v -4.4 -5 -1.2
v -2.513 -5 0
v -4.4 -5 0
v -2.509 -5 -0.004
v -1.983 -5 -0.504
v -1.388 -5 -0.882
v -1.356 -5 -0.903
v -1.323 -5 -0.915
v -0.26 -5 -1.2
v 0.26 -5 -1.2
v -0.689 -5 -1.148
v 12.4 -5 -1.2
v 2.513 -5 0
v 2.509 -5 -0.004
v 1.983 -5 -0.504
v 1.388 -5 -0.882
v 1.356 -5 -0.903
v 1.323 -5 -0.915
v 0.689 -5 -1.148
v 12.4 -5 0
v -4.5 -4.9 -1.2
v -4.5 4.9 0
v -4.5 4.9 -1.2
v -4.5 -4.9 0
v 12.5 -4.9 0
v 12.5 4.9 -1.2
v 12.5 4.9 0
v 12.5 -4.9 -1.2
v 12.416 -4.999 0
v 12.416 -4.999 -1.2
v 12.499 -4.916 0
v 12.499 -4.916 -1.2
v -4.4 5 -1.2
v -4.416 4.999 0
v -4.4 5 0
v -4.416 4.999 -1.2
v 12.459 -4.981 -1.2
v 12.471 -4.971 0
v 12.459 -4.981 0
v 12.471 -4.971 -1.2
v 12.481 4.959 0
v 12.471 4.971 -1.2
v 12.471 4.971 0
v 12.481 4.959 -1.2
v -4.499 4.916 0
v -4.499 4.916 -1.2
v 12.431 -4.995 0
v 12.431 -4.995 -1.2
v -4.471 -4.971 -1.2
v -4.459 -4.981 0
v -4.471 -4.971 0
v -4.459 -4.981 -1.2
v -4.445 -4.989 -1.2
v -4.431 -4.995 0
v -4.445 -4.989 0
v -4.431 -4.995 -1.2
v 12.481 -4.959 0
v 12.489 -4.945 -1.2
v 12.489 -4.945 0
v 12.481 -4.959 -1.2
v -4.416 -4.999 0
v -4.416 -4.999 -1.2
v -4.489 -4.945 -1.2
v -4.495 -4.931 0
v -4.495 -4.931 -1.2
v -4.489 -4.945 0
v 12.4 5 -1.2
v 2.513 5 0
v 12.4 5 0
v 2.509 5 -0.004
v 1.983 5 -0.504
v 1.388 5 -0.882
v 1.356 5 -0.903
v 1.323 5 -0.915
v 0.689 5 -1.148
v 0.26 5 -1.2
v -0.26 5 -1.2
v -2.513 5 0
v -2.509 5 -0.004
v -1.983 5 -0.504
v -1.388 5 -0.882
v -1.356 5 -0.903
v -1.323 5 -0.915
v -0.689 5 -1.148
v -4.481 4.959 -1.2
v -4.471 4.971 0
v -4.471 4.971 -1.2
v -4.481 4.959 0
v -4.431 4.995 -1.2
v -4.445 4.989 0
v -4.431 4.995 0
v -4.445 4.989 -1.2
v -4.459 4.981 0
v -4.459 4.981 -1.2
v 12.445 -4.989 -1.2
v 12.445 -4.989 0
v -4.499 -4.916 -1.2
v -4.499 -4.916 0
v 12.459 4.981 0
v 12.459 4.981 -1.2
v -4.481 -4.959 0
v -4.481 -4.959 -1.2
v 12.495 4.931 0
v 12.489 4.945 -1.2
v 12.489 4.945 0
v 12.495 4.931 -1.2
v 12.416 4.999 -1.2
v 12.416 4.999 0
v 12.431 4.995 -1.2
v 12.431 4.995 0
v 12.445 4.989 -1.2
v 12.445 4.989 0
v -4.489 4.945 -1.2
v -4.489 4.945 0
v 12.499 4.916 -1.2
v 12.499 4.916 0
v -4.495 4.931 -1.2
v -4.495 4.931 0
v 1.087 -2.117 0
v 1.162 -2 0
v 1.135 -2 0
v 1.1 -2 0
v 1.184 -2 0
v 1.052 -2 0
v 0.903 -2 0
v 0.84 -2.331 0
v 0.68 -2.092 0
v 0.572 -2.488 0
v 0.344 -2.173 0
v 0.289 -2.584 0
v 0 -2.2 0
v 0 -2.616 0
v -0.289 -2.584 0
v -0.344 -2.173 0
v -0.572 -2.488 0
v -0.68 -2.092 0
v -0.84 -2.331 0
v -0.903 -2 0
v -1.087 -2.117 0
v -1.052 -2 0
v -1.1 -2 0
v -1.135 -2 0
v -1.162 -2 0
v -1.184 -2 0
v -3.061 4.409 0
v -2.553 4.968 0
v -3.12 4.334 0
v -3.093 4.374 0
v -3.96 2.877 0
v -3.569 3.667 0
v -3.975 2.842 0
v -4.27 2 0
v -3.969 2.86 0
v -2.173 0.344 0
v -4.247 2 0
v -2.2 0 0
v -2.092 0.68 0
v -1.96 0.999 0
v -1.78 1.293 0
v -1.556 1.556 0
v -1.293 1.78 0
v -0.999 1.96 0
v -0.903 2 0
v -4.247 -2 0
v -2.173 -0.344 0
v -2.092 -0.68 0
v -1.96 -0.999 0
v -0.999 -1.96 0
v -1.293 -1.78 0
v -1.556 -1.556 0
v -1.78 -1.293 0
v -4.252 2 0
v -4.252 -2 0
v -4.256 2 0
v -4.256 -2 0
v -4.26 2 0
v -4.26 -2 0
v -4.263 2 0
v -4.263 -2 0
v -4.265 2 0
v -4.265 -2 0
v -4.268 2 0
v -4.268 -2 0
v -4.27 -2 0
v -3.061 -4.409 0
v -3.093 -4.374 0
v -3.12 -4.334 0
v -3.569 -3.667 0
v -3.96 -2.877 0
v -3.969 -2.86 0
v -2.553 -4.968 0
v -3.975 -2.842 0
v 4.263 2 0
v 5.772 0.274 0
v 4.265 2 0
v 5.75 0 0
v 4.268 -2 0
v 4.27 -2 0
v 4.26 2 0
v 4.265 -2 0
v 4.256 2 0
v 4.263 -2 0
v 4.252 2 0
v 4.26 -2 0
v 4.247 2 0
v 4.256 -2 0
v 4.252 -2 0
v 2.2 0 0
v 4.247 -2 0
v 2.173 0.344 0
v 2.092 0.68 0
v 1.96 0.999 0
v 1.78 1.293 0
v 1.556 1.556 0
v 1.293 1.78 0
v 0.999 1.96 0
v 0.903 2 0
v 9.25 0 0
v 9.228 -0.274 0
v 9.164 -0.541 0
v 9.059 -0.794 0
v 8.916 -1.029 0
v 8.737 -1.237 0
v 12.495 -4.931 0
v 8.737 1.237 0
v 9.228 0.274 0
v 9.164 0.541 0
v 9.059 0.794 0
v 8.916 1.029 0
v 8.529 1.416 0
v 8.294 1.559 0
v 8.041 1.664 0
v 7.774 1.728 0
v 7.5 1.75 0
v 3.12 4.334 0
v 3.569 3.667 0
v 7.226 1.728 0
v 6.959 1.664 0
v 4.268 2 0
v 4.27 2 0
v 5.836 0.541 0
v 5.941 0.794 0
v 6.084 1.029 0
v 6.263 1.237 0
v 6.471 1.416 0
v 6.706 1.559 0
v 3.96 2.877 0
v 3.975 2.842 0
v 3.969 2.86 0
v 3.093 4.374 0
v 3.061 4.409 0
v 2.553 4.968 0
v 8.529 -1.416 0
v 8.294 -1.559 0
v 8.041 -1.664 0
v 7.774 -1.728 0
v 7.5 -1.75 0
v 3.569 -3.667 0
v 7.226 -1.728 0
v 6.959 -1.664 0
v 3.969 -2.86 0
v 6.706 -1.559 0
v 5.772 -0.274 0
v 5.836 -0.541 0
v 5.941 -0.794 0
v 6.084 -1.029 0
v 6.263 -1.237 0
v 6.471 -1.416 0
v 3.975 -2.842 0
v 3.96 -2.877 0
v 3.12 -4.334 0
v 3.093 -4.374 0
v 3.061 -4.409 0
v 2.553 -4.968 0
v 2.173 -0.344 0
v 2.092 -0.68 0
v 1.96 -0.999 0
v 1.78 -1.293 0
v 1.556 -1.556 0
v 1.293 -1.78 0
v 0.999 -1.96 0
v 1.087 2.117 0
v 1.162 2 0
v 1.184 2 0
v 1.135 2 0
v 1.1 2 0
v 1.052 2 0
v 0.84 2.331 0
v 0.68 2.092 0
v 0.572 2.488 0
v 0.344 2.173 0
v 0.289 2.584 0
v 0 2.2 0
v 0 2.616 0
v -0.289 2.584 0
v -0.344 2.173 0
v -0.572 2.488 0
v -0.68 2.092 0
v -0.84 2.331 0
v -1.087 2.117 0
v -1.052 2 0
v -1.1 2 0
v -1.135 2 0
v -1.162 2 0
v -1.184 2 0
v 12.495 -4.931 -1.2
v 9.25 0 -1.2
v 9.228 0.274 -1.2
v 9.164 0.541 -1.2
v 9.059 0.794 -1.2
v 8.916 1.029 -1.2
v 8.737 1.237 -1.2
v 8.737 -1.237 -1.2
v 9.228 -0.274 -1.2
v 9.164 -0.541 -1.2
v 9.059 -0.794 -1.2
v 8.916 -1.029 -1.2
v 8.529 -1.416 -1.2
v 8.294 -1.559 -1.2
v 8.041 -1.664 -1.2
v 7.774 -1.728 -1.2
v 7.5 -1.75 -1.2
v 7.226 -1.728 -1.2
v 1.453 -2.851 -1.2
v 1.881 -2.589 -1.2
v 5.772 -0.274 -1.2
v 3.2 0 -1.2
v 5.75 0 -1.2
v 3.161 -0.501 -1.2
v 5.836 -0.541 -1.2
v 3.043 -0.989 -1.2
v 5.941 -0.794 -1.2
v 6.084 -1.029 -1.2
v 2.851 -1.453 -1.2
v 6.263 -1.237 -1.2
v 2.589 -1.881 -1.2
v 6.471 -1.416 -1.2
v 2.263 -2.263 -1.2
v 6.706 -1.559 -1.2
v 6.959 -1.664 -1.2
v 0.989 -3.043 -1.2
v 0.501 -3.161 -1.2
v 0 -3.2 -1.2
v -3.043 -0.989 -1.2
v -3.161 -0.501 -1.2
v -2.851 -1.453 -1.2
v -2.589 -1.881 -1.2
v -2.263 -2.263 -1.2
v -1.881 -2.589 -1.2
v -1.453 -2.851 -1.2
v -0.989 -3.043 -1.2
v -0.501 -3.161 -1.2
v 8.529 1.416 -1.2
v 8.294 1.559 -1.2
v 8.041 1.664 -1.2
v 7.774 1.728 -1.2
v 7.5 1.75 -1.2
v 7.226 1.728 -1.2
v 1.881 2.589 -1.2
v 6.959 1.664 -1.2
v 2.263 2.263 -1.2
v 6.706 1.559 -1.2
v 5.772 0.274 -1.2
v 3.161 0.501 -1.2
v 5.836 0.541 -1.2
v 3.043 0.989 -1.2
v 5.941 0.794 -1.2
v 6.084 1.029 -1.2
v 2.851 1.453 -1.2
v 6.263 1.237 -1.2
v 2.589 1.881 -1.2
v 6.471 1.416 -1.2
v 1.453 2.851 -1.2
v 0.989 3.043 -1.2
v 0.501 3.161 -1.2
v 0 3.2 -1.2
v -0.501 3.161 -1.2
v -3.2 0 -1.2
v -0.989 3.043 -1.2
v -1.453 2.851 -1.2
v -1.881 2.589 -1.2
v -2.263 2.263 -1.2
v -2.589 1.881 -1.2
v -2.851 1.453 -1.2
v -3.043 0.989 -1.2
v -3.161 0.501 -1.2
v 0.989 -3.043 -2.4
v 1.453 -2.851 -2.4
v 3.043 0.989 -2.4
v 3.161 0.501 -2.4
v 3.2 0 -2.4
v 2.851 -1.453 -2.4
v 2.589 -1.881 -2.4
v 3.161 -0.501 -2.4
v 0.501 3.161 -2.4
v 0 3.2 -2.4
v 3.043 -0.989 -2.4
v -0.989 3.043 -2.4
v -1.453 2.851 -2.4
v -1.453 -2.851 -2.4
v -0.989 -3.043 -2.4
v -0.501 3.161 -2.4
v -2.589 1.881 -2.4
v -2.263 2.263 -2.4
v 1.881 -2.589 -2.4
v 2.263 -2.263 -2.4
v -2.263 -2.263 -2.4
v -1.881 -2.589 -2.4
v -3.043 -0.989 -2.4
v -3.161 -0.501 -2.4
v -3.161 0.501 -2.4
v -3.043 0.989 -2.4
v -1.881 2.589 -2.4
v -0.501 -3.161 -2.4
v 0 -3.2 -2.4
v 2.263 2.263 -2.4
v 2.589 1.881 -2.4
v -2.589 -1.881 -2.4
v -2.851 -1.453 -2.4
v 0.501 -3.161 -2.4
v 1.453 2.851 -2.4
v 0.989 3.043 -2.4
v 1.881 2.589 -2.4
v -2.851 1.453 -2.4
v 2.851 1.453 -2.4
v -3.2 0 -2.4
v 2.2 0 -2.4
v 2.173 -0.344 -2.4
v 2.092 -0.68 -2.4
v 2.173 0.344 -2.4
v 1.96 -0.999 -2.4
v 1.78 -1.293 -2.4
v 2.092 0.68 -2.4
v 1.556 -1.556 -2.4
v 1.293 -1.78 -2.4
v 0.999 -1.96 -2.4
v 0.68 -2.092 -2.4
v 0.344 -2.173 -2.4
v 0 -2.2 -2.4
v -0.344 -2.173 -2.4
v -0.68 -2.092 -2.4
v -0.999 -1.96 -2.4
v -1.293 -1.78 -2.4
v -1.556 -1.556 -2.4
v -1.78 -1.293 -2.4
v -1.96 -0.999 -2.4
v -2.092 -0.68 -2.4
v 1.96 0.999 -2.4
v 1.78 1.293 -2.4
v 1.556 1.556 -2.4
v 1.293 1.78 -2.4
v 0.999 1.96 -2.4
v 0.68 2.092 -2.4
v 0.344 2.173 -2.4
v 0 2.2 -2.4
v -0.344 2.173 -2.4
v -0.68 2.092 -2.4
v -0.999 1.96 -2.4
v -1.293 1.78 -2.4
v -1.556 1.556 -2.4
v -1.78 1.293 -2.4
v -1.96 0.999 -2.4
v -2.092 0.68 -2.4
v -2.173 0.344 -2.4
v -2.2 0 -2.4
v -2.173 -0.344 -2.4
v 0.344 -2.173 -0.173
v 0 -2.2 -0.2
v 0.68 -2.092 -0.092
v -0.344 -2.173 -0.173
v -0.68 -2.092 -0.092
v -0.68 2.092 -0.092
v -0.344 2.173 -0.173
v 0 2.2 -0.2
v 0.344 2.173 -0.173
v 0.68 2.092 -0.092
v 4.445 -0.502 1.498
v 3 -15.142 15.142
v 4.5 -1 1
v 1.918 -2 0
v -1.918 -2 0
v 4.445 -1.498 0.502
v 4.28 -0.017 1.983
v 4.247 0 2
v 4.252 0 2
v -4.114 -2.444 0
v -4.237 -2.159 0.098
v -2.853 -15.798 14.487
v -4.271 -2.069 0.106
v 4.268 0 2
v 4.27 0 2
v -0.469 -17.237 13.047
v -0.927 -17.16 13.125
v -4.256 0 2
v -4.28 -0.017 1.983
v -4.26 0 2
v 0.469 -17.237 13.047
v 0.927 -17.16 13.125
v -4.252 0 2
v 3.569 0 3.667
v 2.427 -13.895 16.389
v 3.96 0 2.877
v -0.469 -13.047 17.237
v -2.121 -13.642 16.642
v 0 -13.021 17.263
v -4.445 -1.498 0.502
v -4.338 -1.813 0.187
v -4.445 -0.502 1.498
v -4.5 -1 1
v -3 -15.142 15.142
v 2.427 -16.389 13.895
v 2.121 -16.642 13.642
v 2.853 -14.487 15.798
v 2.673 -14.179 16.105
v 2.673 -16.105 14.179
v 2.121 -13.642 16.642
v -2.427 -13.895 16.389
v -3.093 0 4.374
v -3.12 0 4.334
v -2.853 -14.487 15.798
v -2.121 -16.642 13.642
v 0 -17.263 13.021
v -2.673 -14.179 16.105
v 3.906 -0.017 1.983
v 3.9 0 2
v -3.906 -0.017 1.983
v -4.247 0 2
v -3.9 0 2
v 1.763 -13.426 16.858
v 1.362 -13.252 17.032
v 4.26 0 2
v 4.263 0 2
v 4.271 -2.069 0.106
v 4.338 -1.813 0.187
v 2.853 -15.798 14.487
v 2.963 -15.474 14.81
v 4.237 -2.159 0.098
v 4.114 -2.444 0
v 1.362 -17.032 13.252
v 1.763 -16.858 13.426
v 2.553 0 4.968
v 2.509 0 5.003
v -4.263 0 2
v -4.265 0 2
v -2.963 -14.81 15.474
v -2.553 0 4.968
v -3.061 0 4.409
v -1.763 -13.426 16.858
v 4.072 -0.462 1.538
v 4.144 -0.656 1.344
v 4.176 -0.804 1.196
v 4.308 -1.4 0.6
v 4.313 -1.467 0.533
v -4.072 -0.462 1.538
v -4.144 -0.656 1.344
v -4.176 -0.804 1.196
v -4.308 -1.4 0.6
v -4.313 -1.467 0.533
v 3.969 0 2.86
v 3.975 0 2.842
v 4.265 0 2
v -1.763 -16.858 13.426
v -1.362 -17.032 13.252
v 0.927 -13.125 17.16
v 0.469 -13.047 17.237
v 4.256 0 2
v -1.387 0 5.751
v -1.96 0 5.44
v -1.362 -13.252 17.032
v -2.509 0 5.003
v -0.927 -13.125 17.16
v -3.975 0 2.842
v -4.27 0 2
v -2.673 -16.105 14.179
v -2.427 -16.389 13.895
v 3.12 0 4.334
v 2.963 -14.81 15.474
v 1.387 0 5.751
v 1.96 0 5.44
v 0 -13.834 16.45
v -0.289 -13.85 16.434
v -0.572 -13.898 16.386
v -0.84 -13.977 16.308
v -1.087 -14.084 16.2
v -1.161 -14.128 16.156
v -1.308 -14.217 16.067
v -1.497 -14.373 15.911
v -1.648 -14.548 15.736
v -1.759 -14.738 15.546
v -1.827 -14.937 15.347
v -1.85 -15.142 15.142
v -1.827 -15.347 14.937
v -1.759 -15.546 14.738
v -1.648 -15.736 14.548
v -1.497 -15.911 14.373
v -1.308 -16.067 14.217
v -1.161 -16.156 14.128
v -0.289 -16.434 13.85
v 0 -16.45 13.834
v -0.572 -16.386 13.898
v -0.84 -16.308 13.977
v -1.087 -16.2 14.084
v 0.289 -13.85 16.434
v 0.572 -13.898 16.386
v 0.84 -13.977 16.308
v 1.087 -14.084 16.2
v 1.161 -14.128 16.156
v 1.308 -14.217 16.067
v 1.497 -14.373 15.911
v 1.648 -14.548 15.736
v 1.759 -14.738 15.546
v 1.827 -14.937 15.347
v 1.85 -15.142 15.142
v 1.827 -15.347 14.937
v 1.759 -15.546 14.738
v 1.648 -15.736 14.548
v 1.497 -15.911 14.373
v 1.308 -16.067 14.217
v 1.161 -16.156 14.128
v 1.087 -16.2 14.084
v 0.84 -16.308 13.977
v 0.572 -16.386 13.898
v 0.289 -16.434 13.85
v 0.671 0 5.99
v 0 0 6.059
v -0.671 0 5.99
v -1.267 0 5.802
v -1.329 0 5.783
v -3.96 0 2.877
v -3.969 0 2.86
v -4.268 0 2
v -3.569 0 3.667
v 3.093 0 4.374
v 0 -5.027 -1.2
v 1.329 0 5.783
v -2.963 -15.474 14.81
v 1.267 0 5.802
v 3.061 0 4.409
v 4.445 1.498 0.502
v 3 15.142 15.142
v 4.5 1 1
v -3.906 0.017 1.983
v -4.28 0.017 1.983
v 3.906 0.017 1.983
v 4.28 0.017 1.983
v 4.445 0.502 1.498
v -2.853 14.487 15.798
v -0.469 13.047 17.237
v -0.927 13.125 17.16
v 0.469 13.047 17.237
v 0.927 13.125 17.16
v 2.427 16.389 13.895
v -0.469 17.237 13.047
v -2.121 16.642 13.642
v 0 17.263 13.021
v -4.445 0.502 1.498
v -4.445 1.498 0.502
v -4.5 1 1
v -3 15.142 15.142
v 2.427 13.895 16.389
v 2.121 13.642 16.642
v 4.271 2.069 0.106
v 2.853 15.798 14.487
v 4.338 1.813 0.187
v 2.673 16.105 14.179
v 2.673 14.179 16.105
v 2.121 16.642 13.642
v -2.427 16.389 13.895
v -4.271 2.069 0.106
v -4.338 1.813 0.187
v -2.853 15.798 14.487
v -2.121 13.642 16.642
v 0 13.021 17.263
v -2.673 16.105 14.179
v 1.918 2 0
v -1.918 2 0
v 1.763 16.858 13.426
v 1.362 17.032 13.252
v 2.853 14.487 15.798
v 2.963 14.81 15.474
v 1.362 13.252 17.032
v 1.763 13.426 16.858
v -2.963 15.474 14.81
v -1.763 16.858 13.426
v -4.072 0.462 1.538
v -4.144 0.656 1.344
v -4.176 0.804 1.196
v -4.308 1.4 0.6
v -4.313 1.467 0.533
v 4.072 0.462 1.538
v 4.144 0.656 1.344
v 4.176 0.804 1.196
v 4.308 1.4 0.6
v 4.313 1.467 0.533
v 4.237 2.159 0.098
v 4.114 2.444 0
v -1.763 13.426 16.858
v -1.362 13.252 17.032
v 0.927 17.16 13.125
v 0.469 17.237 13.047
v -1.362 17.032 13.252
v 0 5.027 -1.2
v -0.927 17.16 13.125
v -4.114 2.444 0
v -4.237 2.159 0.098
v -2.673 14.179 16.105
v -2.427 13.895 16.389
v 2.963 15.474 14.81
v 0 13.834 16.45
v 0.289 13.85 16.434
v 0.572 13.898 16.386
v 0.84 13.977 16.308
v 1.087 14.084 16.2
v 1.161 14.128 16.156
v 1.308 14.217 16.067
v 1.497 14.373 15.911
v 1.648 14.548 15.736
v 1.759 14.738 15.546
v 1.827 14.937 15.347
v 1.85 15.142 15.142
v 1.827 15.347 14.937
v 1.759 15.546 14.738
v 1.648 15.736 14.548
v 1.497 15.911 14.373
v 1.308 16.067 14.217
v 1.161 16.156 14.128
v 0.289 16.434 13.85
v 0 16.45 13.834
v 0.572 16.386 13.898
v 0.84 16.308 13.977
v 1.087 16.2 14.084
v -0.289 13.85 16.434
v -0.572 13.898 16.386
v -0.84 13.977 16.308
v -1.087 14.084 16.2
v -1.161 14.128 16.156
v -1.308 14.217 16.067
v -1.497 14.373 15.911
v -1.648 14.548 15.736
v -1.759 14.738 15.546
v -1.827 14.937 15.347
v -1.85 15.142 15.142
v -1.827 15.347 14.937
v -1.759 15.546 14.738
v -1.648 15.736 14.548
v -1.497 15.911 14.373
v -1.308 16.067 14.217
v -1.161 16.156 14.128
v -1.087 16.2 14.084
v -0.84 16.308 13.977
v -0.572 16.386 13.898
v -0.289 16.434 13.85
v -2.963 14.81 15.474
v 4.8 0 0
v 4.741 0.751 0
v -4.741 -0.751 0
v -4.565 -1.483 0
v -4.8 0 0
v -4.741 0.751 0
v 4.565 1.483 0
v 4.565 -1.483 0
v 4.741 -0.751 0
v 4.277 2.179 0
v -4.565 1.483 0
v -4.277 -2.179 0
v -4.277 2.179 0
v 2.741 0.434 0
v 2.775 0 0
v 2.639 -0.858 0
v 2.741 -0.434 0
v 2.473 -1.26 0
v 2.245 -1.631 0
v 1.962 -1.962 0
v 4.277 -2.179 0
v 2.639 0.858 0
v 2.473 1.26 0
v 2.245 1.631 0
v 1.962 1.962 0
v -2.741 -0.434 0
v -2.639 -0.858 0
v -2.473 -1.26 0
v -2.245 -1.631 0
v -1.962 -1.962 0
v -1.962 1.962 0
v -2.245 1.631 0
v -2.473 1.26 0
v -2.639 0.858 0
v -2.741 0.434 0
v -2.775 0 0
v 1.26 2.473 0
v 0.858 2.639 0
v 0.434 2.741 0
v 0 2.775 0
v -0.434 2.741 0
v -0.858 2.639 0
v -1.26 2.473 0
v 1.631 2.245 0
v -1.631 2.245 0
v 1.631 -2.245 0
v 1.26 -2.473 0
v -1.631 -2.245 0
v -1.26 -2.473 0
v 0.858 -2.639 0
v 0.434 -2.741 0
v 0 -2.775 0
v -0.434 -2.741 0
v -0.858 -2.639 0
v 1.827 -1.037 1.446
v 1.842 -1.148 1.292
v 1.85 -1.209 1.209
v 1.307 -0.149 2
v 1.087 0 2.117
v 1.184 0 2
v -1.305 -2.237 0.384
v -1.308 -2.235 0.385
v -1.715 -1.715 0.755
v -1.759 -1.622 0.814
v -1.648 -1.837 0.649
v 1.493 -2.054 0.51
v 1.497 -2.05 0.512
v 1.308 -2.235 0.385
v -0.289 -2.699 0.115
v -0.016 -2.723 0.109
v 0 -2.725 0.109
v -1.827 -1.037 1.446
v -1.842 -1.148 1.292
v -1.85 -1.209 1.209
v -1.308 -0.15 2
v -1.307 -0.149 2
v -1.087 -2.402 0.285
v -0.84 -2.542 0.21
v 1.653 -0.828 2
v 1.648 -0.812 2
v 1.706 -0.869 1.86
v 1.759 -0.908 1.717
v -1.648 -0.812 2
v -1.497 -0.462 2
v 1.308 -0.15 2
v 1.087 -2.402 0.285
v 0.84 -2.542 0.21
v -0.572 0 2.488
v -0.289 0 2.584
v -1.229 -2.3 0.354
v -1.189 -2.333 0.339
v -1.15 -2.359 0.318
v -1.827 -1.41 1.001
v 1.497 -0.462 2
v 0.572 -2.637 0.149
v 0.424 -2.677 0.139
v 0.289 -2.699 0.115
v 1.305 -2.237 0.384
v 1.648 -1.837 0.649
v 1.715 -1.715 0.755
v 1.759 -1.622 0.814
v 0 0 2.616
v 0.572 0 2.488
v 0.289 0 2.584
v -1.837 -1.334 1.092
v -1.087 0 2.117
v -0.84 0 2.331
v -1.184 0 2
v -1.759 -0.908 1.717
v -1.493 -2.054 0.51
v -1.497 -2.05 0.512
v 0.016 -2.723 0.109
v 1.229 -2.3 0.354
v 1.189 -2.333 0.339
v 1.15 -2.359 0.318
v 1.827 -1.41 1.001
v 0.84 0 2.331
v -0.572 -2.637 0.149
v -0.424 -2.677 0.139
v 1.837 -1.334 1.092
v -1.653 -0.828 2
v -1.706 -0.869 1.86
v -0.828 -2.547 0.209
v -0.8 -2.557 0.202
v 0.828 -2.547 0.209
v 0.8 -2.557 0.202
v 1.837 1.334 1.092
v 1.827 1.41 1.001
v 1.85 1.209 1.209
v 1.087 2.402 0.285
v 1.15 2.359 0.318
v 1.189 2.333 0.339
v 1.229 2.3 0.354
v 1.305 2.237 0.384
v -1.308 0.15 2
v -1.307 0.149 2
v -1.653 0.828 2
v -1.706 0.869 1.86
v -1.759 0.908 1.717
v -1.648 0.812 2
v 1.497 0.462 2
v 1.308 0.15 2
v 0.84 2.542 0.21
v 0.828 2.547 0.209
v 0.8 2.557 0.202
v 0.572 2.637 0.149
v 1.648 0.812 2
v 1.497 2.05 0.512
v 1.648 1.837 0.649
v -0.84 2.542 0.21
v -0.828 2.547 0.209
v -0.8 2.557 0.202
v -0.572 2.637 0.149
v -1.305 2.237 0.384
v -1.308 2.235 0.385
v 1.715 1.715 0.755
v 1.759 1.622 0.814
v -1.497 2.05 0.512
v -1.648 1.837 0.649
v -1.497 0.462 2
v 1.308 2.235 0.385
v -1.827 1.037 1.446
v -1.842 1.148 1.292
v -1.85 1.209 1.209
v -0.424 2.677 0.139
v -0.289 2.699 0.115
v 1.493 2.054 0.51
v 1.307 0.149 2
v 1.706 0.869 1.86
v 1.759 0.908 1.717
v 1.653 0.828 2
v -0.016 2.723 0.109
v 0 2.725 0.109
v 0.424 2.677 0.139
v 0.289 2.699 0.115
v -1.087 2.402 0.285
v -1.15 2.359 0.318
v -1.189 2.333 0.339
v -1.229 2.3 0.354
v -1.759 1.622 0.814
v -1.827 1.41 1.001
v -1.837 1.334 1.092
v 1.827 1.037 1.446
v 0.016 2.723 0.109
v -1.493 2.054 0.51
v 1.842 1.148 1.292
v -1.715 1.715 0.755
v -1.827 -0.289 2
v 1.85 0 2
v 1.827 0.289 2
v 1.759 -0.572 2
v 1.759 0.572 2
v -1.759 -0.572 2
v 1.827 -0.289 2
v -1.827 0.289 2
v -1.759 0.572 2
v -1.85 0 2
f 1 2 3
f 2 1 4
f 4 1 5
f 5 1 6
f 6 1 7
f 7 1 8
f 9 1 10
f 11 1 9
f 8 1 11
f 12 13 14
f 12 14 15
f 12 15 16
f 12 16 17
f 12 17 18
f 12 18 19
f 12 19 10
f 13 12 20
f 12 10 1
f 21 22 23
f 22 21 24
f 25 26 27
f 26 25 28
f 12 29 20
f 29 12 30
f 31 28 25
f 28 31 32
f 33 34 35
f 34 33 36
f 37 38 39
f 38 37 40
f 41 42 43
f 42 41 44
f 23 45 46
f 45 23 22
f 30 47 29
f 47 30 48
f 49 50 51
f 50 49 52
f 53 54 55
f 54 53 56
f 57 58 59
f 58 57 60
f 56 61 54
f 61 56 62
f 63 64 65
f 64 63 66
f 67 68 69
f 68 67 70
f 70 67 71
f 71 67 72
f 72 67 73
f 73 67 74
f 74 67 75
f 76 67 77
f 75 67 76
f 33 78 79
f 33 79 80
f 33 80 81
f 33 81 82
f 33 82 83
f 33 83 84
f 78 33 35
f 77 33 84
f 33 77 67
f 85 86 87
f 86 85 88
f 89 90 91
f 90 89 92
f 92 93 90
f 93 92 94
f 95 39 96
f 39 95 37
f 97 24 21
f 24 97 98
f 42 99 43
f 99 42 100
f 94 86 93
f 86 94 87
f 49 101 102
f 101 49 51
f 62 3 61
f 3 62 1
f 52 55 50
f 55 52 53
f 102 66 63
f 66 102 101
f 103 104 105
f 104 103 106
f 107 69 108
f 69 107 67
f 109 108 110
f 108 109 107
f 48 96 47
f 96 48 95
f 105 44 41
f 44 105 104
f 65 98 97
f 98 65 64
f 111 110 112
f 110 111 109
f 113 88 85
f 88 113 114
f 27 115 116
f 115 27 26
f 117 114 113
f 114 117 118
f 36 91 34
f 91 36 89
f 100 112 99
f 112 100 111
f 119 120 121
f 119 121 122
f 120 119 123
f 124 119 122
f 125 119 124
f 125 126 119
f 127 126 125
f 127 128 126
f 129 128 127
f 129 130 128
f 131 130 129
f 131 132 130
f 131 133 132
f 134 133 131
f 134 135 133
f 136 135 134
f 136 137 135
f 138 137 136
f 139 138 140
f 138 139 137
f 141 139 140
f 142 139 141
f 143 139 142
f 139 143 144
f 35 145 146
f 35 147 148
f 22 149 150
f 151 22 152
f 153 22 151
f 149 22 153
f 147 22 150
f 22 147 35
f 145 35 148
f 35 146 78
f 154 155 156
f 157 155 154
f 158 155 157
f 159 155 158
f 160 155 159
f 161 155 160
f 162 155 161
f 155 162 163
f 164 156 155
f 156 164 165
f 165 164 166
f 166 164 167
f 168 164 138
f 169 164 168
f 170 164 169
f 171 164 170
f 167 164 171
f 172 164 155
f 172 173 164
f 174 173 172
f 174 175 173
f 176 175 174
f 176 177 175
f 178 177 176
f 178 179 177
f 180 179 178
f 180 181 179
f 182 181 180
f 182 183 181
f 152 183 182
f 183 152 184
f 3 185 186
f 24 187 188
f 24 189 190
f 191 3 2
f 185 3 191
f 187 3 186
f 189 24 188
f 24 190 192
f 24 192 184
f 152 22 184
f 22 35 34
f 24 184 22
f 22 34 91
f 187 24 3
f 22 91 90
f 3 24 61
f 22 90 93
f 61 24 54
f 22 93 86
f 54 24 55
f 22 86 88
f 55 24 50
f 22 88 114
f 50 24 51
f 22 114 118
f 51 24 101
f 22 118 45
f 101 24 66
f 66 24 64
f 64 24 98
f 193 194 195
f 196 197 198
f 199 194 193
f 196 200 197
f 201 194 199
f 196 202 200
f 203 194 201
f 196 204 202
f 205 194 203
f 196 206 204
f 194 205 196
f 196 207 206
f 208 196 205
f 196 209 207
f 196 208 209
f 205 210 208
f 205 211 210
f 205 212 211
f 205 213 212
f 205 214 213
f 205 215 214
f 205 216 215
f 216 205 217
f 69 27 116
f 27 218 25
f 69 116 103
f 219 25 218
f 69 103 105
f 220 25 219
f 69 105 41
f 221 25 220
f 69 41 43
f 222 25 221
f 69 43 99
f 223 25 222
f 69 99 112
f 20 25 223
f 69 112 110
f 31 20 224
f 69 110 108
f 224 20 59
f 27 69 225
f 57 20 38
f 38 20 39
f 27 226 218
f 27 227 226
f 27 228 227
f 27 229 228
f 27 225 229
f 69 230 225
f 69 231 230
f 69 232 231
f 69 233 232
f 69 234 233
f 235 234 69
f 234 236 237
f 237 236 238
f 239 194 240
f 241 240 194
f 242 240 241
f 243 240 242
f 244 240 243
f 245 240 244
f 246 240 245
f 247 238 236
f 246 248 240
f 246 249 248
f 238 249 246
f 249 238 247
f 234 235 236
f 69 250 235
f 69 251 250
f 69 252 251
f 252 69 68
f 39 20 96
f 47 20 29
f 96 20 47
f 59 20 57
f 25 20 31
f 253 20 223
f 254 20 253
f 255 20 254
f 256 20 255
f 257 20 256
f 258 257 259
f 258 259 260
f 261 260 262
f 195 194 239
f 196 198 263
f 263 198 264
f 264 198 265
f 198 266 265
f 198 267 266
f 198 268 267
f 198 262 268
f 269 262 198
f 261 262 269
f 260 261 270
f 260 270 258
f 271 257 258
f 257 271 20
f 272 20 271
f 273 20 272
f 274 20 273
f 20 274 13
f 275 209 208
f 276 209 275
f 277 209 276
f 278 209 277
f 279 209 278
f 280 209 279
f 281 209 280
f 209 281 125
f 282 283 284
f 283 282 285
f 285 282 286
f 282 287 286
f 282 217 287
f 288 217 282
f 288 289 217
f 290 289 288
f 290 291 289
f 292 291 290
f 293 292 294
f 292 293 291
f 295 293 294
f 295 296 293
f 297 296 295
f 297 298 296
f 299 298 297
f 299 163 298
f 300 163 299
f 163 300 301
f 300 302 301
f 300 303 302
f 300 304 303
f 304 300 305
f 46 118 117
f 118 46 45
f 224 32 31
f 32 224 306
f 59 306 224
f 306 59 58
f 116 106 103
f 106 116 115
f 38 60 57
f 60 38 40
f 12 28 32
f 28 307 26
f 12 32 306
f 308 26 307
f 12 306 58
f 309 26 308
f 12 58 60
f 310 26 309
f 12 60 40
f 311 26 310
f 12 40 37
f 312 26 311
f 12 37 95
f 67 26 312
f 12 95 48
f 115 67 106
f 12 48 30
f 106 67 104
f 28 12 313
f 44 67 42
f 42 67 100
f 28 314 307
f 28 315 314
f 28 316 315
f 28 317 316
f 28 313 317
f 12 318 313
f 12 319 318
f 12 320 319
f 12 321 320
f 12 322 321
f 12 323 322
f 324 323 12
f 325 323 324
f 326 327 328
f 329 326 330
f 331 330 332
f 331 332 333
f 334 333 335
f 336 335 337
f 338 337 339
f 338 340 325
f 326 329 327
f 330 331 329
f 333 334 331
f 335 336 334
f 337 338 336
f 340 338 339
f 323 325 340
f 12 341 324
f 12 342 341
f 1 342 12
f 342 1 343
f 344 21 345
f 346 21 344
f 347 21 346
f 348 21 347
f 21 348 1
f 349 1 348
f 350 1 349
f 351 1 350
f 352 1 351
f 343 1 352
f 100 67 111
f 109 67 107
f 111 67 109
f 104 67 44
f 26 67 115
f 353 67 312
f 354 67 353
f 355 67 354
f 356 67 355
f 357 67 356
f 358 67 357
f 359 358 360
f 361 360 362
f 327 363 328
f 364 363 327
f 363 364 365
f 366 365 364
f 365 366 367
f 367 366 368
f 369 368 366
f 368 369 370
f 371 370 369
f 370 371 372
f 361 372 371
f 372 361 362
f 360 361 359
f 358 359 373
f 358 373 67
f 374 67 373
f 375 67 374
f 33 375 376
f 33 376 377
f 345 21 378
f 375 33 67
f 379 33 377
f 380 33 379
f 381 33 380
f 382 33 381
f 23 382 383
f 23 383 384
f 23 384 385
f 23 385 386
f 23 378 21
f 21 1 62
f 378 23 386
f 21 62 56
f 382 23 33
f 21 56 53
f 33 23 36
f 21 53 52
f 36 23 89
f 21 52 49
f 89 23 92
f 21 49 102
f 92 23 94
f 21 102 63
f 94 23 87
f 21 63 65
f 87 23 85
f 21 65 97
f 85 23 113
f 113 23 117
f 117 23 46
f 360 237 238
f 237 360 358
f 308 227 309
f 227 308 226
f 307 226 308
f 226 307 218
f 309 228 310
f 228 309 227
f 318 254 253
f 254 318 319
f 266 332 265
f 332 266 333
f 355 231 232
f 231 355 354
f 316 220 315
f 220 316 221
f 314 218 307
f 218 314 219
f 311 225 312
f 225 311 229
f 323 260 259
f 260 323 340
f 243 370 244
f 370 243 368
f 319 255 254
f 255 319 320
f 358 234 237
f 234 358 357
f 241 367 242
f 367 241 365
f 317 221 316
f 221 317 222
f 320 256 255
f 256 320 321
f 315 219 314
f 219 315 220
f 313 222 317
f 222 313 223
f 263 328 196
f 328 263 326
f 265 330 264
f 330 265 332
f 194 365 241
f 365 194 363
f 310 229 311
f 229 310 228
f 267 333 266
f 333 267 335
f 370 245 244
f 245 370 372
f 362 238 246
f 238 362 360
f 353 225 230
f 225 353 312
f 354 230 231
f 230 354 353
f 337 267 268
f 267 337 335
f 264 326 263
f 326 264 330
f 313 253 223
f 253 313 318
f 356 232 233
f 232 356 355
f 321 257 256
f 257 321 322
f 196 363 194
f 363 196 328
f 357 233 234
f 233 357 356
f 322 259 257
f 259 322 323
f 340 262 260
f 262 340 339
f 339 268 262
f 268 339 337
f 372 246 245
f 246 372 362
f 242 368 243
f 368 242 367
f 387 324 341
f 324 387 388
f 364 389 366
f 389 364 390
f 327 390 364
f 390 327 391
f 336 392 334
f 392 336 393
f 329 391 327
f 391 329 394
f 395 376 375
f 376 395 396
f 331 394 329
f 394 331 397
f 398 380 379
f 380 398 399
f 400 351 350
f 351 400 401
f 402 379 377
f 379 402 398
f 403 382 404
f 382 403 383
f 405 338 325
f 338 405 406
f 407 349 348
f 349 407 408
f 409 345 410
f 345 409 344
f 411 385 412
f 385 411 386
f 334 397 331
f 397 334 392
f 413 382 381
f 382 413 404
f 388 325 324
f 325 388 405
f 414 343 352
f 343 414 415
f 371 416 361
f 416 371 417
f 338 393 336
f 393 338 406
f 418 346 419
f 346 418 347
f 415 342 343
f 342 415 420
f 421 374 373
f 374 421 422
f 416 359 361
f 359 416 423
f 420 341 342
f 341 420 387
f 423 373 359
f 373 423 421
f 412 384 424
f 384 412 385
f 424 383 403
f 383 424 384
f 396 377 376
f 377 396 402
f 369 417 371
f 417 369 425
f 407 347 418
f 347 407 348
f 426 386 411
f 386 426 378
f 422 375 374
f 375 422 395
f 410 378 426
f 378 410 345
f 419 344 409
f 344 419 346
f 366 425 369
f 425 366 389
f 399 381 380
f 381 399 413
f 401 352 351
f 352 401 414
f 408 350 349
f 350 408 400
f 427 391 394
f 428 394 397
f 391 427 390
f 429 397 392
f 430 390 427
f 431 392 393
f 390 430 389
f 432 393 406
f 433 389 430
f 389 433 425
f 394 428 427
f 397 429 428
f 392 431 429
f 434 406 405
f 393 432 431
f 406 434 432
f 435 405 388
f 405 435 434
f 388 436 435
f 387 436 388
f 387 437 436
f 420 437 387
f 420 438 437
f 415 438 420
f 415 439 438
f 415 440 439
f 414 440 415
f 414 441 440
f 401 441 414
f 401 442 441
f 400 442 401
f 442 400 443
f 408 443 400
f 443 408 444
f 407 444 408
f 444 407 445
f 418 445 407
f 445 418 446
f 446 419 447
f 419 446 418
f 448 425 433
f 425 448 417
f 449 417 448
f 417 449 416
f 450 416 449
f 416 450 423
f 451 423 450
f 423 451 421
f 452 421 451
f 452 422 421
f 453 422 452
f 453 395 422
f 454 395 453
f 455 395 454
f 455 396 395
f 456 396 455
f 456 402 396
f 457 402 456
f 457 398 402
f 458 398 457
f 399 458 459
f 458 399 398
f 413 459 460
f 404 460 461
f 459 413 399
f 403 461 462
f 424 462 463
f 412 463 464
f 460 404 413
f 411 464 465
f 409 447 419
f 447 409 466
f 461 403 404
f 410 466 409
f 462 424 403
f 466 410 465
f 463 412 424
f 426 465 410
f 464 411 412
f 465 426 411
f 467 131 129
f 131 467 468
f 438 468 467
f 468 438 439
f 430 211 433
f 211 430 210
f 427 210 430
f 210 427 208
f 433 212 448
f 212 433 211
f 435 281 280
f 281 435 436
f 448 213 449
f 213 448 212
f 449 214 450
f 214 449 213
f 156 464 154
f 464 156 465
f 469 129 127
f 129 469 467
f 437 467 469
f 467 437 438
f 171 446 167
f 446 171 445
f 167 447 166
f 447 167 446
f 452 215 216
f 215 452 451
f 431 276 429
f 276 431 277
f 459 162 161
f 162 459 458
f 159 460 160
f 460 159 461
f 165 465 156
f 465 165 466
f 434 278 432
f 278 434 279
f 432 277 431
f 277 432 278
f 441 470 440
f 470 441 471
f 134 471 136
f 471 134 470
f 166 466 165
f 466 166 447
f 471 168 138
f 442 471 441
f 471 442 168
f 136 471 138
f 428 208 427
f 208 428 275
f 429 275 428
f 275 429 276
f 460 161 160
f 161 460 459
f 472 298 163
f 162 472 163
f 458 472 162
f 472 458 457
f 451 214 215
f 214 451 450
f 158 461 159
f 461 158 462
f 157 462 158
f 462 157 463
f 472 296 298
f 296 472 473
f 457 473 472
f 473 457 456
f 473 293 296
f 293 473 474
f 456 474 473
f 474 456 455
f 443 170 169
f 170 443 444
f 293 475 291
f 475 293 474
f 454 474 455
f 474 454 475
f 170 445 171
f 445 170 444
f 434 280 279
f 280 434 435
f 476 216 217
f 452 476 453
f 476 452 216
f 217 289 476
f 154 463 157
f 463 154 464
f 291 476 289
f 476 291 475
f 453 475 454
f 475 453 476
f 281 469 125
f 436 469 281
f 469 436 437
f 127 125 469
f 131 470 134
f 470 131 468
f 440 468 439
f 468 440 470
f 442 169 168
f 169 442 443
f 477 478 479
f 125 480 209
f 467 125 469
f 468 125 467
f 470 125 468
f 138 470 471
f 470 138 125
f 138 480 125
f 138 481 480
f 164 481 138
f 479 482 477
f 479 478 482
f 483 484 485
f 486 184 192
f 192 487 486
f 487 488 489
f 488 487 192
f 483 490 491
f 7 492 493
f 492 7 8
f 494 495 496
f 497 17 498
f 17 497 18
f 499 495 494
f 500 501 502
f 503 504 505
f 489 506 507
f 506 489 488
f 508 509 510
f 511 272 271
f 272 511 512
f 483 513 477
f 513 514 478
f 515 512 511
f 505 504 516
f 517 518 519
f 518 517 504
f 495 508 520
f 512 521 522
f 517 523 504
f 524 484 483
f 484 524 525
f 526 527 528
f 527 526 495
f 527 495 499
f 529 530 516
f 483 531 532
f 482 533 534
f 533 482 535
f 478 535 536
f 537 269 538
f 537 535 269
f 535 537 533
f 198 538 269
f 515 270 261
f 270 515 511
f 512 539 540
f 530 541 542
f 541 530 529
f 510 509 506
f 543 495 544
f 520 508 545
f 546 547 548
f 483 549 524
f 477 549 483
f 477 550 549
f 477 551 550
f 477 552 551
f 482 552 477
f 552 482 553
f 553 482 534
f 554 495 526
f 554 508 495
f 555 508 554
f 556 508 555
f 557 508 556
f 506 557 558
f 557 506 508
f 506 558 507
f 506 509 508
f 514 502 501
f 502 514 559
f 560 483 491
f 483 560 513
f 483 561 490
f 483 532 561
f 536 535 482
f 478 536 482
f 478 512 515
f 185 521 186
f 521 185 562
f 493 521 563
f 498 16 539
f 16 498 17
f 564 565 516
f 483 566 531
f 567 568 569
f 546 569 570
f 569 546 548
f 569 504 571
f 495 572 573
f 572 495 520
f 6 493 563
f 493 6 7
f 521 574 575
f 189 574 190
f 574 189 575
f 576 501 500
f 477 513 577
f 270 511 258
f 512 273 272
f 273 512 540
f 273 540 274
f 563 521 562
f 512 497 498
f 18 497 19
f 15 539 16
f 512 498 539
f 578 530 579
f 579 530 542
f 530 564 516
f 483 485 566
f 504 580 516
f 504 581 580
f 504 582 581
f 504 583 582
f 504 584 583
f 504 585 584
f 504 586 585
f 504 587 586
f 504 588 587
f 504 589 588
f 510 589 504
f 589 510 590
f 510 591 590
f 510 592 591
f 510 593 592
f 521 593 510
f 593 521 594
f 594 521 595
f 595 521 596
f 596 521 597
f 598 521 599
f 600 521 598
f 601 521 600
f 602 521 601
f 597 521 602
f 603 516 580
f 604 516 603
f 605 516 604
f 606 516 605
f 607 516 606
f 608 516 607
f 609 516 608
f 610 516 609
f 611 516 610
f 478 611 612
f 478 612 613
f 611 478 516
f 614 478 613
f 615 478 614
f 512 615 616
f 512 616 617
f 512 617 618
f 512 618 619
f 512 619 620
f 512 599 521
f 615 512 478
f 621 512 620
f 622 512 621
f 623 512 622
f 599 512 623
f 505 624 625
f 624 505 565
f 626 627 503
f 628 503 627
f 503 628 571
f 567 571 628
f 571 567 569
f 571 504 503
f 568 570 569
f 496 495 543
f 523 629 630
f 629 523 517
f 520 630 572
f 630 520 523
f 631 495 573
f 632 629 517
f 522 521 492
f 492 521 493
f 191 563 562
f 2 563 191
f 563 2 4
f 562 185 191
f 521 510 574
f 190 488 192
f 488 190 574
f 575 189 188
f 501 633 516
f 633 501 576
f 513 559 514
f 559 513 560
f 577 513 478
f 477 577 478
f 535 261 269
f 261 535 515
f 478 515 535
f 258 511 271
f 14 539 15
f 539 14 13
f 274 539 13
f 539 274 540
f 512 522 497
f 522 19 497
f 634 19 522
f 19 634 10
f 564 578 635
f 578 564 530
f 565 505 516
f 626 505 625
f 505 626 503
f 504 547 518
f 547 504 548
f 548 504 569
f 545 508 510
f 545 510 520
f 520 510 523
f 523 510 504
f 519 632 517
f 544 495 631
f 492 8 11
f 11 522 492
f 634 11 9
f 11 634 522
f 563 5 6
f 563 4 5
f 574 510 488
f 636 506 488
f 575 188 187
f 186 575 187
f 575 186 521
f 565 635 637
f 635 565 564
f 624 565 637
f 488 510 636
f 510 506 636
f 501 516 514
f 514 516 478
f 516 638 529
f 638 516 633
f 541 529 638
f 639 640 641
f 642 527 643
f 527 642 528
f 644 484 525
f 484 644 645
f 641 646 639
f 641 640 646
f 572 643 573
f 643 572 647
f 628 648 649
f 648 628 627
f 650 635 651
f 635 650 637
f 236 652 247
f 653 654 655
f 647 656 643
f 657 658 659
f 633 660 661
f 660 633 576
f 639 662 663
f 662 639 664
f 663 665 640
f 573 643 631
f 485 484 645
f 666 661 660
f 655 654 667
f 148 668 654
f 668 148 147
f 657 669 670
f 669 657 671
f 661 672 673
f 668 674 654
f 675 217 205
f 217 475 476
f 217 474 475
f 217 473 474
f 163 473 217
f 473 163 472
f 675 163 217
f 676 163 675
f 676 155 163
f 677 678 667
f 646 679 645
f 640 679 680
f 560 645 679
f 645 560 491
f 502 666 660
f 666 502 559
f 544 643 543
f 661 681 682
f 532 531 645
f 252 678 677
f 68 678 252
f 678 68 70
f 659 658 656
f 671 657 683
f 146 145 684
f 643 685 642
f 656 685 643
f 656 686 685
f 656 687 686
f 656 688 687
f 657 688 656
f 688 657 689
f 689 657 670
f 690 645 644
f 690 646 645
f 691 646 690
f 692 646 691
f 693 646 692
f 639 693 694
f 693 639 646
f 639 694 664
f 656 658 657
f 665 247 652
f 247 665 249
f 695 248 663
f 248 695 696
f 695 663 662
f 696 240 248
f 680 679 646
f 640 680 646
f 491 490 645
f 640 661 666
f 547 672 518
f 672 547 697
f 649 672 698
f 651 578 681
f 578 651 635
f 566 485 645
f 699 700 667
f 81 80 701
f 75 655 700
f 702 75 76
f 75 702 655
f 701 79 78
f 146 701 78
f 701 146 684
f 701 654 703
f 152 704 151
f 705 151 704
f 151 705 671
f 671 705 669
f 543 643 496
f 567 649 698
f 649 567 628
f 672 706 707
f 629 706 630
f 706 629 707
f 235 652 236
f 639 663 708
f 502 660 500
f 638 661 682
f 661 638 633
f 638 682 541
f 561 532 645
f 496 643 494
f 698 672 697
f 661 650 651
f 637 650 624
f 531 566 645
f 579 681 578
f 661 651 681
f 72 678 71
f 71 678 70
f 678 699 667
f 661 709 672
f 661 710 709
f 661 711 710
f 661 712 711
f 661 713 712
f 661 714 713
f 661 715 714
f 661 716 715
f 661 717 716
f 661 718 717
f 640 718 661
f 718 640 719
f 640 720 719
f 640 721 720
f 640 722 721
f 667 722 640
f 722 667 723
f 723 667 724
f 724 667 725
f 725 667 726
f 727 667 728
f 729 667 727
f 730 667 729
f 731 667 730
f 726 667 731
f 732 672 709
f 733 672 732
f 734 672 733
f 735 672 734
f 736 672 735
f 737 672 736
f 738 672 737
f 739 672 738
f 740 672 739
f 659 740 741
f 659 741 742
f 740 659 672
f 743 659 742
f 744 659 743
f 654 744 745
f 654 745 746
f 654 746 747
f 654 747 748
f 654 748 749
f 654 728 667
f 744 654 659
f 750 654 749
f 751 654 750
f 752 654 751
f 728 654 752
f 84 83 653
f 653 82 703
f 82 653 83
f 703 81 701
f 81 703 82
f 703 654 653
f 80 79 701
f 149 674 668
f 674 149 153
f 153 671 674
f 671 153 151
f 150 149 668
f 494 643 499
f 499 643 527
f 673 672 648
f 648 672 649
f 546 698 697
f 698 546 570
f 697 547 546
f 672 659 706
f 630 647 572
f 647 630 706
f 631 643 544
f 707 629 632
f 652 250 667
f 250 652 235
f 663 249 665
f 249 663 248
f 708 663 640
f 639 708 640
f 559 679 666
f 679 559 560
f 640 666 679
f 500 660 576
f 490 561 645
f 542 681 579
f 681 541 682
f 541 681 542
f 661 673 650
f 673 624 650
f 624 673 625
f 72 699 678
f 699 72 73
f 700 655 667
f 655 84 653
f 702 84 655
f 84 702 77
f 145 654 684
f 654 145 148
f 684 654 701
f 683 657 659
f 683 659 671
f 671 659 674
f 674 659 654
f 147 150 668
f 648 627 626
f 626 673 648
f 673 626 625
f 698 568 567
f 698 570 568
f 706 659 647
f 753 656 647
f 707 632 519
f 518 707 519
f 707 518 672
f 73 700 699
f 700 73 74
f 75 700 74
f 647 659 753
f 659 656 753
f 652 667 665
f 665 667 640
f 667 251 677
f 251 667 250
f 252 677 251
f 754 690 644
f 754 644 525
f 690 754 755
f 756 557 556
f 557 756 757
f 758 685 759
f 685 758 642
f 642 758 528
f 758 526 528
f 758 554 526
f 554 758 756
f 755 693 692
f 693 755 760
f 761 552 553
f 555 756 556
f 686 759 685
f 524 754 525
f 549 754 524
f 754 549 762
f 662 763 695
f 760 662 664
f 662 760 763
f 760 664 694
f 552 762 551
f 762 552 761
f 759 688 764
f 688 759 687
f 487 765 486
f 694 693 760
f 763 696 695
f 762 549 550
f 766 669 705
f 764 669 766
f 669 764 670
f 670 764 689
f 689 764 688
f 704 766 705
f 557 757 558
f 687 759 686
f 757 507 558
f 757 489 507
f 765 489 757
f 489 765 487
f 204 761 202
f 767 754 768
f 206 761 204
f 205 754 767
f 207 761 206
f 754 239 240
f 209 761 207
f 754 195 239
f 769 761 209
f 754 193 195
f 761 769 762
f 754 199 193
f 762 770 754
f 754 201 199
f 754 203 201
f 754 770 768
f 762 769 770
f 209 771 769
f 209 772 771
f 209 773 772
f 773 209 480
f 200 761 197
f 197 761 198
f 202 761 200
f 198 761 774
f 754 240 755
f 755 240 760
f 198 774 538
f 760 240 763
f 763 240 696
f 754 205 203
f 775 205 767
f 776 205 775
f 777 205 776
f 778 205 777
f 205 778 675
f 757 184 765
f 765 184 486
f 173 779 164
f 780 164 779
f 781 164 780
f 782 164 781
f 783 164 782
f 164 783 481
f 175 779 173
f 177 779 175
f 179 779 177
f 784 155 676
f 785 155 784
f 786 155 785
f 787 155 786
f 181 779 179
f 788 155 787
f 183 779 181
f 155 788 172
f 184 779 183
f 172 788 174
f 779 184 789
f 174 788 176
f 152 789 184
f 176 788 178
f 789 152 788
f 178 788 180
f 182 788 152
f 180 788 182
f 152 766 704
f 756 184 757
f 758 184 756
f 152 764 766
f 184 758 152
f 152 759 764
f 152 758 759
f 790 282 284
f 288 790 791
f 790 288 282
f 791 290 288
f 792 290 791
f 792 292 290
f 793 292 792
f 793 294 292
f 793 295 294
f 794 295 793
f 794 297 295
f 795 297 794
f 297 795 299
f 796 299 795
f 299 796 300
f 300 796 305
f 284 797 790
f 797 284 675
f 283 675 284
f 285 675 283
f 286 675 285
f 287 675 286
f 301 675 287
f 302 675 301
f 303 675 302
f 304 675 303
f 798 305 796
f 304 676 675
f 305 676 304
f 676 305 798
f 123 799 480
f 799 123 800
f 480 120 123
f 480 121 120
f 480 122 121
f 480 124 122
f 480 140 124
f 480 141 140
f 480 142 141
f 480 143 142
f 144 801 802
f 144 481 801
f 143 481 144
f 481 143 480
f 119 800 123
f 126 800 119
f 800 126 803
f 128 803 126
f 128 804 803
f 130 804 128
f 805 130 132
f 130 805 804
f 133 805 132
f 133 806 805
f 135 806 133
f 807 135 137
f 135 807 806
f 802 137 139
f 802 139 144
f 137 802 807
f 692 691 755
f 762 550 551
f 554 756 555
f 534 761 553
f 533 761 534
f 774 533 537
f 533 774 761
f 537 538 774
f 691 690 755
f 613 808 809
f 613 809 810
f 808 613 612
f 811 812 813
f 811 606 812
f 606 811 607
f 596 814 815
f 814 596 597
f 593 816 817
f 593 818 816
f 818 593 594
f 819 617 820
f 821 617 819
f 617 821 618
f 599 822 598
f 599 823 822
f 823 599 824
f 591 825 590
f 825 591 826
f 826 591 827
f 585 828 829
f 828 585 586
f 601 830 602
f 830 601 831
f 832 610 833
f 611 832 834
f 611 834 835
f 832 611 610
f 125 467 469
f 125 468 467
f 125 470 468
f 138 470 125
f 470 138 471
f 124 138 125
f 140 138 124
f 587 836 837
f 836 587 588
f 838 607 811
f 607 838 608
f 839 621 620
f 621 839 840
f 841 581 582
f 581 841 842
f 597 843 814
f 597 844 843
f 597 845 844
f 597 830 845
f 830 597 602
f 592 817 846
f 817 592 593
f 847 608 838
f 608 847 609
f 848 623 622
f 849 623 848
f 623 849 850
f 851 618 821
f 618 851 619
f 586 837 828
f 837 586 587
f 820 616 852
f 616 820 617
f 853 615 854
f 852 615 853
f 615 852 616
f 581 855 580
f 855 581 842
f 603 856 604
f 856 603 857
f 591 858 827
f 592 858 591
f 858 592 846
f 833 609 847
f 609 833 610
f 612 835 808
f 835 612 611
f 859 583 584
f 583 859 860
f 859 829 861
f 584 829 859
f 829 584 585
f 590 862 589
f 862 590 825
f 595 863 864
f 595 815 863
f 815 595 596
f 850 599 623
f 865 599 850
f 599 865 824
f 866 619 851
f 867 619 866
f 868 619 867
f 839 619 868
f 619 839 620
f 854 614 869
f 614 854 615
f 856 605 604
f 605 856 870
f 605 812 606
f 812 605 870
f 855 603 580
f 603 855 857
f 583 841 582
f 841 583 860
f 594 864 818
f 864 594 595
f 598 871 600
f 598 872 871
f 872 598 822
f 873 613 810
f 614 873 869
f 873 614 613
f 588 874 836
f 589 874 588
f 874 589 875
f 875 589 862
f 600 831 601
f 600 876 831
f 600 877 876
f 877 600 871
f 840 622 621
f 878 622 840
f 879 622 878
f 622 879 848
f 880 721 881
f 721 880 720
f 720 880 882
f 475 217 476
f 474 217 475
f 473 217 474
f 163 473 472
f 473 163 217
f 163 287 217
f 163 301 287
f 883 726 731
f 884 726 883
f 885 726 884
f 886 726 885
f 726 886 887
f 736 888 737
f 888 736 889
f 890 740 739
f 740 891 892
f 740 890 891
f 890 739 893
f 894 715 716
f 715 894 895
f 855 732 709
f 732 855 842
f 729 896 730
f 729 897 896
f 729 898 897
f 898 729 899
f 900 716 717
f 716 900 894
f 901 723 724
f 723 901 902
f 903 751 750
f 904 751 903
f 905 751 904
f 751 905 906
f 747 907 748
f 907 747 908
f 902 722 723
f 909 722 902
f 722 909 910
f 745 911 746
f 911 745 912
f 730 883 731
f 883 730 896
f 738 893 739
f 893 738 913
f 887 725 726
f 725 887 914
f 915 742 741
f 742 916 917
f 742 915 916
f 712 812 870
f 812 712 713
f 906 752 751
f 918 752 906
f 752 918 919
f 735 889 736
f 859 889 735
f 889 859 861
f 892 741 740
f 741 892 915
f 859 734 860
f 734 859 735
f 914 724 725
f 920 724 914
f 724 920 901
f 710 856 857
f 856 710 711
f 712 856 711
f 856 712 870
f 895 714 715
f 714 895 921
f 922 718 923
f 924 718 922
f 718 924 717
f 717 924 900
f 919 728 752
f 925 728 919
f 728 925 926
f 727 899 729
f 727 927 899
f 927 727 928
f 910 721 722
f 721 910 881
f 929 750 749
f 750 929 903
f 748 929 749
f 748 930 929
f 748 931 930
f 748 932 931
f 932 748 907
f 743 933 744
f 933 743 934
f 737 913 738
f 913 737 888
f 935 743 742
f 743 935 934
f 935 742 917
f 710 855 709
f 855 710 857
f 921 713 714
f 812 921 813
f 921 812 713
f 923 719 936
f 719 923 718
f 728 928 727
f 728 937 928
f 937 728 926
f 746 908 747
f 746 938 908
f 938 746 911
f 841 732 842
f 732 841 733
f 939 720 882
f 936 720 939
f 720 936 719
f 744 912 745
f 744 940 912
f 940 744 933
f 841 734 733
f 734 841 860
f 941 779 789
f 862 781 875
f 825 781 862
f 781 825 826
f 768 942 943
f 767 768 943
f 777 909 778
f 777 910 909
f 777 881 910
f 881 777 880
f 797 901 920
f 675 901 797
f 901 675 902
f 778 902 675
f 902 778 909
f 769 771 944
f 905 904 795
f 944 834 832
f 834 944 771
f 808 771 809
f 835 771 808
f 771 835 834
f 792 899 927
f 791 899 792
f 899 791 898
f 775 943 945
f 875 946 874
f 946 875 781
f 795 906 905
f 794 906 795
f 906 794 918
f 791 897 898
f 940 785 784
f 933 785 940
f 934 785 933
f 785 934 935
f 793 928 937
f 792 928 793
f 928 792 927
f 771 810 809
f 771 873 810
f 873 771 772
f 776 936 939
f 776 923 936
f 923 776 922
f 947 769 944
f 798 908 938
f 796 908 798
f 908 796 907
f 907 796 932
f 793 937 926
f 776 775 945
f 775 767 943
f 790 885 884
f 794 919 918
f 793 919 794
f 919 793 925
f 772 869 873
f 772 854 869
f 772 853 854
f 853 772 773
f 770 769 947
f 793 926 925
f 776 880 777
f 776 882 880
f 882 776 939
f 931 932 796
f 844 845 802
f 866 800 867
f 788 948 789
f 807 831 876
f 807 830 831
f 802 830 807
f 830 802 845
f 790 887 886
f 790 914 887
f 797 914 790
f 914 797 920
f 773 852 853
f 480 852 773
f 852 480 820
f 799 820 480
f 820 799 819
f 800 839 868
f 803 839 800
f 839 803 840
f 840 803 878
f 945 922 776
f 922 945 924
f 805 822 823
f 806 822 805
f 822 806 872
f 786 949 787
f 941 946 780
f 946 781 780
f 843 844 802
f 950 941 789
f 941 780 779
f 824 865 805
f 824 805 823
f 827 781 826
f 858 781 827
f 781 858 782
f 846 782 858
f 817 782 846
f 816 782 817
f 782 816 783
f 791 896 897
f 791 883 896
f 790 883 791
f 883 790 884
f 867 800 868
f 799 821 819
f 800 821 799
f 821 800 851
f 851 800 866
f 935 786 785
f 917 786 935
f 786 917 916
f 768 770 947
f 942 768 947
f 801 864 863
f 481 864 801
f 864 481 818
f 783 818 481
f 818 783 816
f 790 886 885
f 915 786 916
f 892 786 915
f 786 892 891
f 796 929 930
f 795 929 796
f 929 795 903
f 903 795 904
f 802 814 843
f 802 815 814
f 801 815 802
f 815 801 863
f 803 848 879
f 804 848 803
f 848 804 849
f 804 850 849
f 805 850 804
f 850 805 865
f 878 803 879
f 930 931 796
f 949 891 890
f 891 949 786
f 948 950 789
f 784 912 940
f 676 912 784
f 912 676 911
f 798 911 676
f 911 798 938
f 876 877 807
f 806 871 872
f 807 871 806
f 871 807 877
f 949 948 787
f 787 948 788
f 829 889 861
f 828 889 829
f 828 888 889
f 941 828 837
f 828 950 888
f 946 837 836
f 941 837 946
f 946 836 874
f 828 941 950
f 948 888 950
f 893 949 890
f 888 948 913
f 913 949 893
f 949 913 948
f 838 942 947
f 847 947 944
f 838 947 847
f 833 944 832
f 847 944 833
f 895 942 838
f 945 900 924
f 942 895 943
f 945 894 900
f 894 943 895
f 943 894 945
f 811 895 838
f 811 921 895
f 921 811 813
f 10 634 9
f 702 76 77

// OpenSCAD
/*
Quadrysteria QR200 Antenna Holder (c) by Jorge Monteiro

Quadrysteria QR200 Antenna Holder is licensed under a
Creative Commons Attribution-ShareAlike 4.0 International.

You should have received a copy of the license along with this
work.  If not, see <http://creativecommons.org/licenses/by-sa/4.0/>.
*/
/* [Basics] */
// Space between tips in mm
// antenna length in mm
antennaLength = 20;
// antenna outer diameter in mm
antennaOuter = 3;
// antenna inner diameter in mm
antennaInner = 1.85;
// base thickness
thickness=1.2;
// gap thickness
gapThickness=1.2;
// screw width
screwWidth=1.75;
// hole diameter
holeWidth=3.2;

/* [Ignore] */
$fn = 40*1;

drawBase();
drawHolders();

// draw the base
module drawBase() {
    translate([0,0,-(thickness+gapThickness)]){
        difference() {
            translate([4,0,gapThickness]) {
                roundedCube(17, 10, thickness, .1);
            }
            translate([7.5,0,gapThickness]) cylinder(thickness, screwWidth, screwWidth);
            cylinder((thickness+gapThickness), holeWidth, holeWidth);
        }
        difference(){
            cylinder((thickness+gapThickness), holeWidth, holeWidth);
            cylinder((thickness+gapThickness), holeWidth-1, holeWidth-1);
        }
    }
};

//draw the antenna holders
module drawHolders() {
    difference() {
        union() {
            // add the antenna holders
            translate([0,-1,1]){
                rotate([45, 0, 0]){
                    cylinder(antennaLength, antennaOuter+1.5, antennaOuter);
                }
            }
            translate([0,1,1]){
                rotate([-45, 0, 0]){
                    cylinder(antennaLength, antennaOuter+1.5, antennaOuter);
                }
            }
            cylinder(4, antennaOuter*1.6, antennaOuter);


        }
        // remove all the bottom stuff, we do not need it
        translate([0,0,-2.5-thickness]) {
            cube([100,100,5], true);
        }
        union() {
            // and all the interior spots
            translate([0,-1,1]){
                rotate([45, 0, 0]){
                    cylinder(antennaLength*1.5, antennaInner, antennaInner);
                }
            }
            translate([0,1,1]){
                rotate([-45, 0, 0]){
                    cylinder(antennaLength*1.5, antennaInner, antennaInner);
                }
            }
            cylinder(2, antennaInner*1.5, antennaInner);
        }
    };
};

module roundedCube(xdim, ydim, zdim, rdim) {
    translate([-xdim/2,-ydim/2,0]){
        hull(){
            translate([rdim,rdim,0]) cylinder(r=rdim, h=zdim);
            translate([xdim-rdim,rdim,0]) cylinder(r=rdim, h=zdim);

            translate([rdim,ydim-rdim,0]) cylinder(r=rdim, h=zdim);
            translate([xdim-rdim,ydim-rdim,0]) cylinder(r=rdim, h=zdim);

        };
    };
};
